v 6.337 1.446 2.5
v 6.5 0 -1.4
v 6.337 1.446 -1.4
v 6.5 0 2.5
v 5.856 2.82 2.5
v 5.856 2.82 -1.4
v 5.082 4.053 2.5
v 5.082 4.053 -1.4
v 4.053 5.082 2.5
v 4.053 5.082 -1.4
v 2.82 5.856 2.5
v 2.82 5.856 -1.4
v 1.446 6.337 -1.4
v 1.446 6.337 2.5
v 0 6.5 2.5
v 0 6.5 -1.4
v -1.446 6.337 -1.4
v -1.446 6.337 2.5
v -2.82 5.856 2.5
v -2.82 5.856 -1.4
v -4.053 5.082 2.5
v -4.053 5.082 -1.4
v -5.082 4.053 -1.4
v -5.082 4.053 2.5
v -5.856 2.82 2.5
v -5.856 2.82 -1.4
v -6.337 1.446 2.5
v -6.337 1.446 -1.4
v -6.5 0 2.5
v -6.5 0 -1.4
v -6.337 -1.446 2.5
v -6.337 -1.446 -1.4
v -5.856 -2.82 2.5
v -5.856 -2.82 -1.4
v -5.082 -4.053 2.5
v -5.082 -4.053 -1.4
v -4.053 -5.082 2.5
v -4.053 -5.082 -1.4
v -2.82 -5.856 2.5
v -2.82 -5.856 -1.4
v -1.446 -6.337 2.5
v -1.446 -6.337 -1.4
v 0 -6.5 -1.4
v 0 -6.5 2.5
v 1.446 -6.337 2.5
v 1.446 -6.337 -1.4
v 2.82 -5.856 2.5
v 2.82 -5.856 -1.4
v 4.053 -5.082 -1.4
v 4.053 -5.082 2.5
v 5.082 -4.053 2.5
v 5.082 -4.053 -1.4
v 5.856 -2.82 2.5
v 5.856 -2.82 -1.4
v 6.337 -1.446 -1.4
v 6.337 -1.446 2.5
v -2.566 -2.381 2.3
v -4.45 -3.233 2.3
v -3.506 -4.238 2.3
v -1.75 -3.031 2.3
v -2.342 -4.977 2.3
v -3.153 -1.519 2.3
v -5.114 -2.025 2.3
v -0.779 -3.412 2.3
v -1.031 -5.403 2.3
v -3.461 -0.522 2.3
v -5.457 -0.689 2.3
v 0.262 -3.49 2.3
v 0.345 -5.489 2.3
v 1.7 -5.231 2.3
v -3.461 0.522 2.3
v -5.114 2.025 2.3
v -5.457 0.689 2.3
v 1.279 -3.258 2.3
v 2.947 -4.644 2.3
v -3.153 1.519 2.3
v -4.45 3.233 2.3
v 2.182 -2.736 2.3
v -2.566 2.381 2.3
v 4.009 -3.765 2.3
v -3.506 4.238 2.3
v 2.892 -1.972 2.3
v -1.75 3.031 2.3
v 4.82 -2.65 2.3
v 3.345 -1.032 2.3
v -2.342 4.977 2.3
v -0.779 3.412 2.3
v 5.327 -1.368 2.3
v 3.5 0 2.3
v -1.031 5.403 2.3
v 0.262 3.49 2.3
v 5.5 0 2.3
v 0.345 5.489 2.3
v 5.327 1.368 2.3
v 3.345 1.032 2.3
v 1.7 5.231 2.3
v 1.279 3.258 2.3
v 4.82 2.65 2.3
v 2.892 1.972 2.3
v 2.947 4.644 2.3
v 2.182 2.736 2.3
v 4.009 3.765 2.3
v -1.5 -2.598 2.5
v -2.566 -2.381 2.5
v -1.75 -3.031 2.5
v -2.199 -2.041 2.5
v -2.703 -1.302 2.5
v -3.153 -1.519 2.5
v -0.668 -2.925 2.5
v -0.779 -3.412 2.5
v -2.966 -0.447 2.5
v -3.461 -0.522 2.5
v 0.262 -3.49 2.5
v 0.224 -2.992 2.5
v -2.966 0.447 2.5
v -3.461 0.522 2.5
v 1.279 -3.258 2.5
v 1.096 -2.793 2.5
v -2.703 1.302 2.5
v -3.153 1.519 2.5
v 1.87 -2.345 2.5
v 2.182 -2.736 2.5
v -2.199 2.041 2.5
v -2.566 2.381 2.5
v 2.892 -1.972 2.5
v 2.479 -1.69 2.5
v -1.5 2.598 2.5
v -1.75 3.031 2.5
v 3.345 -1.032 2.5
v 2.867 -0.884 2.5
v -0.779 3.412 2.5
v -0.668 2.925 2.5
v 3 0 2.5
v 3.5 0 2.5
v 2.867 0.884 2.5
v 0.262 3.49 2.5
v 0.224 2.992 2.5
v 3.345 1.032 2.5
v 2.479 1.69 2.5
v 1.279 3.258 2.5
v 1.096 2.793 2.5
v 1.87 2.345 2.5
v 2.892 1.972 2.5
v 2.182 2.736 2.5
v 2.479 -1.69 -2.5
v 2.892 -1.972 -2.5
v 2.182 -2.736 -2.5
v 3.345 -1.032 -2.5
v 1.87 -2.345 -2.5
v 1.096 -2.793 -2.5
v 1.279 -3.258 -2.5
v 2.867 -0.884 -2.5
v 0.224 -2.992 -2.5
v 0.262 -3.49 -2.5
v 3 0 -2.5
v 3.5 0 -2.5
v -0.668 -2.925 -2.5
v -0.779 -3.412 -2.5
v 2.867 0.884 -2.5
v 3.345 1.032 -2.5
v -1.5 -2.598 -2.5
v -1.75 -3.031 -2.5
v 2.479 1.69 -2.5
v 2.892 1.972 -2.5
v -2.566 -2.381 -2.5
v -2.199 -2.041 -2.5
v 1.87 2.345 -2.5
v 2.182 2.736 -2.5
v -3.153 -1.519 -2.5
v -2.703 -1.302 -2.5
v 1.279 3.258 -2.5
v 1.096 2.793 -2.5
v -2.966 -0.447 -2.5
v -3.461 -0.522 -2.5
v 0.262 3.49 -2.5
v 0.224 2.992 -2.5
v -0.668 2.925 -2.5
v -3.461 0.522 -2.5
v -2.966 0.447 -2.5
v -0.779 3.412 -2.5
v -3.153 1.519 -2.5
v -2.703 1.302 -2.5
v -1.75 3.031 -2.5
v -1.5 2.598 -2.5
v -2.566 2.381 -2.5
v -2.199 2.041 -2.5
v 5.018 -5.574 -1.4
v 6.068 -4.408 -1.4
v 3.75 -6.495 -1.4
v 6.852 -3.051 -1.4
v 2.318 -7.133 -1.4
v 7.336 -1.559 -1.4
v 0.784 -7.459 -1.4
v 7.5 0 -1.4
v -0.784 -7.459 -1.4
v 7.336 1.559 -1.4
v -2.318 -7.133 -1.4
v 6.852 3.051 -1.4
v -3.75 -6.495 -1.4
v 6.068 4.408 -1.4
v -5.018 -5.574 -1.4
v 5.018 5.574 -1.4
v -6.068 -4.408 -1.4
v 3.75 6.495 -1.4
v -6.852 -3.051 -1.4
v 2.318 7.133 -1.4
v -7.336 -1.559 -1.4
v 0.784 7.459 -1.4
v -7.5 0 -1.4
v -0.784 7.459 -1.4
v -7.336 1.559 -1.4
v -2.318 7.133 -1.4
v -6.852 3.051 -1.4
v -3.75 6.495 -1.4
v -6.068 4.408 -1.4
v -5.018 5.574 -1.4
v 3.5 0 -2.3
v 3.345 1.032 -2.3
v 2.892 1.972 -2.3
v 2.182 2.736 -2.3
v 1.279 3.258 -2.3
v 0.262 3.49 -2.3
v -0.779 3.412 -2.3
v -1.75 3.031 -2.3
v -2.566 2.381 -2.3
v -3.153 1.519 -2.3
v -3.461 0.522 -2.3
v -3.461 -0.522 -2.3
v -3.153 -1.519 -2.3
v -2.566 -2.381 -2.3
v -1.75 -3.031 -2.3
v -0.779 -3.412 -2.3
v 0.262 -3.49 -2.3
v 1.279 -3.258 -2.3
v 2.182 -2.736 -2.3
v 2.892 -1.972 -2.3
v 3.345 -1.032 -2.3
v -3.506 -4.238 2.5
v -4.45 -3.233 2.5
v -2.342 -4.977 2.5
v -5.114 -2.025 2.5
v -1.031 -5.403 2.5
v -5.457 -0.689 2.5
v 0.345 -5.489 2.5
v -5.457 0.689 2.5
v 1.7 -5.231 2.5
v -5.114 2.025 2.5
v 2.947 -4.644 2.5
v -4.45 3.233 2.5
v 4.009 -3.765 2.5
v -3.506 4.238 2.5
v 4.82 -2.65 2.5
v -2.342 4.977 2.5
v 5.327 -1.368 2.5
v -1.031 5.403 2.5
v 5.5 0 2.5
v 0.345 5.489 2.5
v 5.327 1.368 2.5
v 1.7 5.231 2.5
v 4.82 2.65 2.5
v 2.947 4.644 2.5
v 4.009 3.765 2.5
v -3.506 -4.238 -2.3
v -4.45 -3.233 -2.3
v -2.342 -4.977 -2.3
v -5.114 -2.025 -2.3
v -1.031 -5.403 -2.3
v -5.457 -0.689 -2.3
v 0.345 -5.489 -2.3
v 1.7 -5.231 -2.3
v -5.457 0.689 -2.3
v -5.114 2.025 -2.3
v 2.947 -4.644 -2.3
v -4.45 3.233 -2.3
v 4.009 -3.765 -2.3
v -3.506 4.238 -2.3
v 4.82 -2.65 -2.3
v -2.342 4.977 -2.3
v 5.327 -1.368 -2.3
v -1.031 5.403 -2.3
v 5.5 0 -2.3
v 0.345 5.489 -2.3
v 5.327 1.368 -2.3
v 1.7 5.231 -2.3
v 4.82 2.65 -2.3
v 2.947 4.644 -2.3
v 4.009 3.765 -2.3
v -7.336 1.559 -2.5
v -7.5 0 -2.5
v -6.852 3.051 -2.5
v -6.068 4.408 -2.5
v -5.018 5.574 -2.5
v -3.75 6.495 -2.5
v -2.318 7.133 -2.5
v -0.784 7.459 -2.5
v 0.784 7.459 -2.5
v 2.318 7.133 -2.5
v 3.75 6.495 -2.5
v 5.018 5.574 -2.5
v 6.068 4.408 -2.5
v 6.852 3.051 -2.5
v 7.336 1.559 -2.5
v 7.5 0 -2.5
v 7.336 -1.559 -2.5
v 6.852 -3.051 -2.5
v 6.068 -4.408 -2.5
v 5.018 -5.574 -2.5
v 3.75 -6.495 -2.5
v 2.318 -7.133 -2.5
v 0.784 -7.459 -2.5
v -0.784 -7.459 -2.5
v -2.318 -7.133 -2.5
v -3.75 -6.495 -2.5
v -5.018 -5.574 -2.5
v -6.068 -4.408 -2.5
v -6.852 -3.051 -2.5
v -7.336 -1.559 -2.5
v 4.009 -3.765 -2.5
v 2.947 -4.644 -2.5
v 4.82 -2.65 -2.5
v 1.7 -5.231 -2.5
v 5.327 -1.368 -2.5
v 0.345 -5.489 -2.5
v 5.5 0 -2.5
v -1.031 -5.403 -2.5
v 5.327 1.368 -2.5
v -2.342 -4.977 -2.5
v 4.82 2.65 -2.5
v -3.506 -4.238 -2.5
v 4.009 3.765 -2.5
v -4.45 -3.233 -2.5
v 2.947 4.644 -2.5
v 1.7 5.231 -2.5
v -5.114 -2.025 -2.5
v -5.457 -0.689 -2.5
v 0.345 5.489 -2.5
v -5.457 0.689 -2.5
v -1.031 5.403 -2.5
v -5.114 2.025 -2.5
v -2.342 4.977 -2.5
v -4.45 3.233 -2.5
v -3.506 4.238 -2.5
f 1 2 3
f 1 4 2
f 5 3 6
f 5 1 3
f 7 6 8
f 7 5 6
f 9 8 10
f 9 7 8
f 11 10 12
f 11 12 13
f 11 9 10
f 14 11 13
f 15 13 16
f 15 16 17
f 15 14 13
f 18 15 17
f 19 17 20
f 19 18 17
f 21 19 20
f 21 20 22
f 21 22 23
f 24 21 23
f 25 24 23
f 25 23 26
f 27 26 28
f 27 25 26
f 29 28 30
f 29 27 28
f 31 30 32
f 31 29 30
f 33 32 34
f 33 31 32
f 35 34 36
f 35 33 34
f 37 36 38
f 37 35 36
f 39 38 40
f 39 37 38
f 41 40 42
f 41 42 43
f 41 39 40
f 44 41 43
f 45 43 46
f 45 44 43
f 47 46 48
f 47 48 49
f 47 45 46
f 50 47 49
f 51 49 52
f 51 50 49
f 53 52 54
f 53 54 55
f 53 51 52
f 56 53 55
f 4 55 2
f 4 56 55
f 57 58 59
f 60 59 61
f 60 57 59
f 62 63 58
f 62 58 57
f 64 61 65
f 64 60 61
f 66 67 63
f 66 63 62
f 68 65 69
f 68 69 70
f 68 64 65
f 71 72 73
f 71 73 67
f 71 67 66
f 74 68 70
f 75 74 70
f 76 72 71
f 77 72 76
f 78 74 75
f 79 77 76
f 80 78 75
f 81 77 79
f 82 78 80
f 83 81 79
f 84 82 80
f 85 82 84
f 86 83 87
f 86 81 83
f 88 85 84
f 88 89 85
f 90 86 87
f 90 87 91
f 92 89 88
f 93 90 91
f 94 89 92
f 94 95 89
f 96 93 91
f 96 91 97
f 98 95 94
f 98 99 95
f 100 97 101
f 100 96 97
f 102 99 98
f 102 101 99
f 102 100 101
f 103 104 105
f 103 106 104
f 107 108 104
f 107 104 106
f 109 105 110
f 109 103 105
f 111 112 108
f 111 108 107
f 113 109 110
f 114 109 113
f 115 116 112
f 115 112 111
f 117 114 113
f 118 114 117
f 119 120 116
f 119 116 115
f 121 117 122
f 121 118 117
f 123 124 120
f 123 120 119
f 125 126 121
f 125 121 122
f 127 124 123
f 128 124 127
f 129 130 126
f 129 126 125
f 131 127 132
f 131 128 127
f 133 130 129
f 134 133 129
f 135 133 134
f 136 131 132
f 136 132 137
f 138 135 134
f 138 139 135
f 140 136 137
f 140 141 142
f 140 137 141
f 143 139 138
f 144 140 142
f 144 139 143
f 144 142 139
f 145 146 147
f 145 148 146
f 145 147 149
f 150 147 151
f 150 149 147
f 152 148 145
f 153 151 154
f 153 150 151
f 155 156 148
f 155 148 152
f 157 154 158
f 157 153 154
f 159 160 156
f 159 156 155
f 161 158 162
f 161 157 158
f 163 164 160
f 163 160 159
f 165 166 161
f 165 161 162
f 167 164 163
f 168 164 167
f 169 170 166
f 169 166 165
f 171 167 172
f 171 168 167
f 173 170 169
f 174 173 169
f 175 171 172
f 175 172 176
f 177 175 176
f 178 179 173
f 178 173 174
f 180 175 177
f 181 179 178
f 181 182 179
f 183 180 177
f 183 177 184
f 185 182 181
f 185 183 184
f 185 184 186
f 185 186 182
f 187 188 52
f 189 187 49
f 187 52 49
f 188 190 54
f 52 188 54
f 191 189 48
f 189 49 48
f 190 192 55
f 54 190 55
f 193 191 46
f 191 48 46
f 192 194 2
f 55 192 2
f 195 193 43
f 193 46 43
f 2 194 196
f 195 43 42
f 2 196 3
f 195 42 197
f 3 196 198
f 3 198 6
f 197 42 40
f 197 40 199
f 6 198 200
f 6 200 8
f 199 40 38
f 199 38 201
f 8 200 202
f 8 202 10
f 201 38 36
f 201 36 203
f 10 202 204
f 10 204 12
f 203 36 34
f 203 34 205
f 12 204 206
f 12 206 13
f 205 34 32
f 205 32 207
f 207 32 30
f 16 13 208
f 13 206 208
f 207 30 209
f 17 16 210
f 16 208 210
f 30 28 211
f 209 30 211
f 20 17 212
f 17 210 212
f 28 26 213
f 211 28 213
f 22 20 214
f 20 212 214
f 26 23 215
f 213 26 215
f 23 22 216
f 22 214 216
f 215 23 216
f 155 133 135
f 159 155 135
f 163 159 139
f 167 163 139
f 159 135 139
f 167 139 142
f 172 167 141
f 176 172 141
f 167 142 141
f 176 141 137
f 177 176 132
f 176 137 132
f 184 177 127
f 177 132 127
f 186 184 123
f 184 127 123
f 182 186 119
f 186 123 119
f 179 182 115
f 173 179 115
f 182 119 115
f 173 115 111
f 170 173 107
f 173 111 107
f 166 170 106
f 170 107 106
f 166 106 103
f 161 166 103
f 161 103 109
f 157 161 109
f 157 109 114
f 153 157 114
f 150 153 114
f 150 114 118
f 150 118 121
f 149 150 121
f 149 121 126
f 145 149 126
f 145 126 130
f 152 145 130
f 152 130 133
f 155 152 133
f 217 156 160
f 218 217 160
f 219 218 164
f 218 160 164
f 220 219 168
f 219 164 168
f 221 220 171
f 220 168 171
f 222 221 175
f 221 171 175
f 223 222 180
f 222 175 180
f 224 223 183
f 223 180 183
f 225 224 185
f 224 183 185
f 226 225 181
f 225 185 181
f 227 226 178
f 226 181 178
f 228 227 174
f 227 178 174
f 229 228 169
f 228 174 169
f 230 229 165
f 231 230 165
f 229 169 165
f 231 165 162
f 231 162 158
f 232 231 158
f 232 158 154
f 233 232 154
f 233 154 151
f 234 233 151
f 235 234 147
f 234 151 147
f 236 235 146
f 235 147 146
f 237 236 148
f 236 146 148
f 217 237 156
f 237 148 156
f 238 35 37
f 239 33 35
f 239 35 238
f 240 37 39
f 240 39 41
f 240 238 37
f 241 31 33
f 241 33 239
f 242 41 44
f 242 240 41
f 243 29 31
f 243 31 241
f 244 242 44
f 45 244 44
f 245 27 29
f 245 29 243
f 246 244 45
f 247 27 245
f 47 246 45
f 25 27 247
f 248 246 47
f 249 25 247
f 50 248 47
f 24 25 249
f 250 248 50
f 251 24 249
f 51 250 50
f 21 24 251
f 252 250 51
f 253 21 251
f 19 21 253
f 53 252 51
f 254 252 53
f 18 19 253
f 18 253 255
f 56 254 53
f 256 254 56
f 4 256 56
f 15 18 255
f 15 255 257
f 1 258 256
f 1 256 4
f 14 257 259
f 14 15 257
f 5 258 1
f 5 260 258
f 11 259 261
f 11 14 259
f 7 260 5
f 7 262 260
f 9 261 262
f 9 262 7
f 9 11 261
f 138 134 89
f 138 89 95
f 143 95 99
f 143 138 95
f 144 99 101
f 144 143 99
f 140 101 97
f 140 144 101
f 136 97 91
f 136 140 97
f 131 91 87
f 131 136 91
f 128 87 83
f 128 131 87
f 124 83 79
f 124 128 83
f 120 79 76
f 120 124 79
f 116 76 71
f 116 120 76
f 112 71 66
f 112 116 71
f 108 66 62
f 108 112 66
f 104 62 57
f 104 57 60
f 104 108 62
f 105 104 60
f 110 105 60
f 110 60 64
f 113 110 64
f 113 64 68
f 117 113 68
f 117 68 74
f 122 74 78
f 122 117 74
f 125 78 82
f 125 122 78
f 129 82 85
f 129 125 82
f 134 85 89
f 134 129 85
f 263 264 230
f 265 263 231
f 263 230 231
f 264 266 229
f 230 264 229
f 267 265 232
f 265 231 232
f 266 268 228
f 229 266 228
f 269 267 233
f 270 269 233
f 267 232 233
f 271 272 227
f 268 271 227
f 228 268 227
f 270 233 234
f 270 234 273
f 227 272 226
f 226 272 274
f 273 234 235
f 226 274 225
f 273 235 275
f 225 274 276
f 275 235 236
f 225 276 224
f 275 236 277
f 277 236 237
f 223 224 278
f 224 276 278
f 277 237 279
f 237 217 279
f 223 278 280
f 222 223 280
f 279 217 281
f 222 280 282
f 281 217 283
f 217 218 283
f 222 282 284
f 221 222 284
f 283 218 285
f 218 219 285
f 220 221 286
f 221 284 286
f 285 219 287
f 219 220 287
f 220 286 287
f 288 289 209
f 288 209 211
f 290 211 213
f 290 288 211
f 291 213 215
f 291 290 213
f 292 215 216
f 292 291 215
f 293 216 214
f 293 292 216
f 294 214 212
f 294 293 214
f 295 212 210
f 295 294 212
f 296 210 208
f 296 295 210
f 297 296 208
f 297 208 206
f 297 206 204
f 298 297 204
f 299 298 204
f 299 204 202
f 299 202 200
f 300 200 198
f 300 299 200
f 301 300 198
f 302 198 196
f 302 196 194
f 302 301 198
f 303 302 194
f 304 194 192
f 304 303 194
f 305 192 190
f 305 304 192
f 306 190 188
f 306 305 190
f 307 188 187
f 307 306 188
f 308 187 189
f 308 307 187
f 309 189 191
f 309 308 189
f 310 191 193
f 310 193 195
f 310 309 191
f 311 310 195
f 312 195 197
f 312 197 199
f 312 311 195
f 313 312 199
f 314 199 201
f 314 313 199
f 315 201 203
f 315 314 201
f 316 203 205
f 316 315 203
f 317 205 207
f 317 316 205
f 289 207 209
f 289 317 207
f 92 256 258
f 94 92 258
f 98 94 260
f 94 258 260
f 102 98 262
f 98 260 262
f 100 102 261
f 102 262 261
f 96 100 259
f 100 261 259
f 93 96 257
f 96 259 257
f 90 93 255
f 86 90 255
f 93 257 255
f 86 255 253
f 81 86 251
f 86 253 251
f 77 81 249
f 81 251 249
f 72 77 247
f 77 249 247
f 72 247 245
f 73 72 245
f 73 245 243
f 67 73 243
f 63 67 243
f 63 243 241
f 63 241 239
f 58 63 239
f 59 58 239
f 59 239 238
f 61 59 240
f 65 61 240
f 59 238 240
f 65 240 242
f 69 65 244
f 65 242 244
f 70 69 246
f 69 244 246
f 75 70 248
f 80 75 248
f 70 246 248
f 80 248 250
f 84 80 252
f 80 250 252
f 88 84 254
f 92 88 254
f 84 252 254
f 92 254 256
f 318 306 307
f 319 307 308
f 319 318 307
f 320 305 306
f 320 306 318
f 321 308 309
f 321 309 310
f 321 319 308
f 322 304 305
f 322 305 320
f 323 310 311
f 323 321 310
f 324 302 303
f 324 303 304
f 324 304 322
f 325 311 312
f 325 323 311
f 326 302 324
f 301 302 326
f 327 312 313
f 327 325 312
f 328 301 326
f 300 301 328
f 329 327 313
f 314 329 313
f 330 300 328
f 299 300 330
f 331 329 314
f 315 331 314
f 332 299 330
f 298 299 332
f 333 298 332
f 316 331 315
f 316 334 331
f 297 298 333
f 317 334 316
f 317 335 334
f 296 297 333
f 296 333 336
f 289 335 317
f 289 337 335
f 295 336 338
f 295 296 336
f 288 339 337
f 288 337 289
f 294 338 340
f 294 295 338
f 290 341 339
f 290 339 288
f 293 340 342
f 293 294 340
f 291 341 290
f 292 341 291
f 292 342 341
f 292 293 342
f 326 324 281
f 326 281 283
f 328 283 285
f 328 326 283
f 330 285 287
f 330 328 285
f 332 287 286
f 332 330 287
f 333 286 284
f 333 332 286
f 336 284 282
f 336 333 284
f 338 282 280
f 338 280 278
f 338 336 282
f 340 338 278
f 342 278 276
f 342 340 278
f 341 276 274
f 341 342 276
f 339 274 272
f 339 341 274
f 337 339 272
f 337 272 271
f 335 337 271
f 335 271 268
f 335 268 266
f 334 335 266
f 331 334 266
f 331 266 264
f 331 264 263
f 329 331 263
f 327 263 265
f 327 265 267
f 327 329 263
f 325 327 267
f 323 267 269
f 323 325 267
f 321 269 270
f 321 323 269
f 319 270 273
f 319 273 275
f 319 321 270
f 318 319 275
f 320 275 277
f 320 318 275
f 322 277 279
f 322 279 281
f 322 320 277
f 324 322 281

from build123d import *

# Parameters (mm, degrees)
SKETCH_1_R          = 6.5
EXTRUDE_1_DEPTH     = 2.5
SKETCH_4_R          = 7.5
EXTRUDE_2_DEPTH     = 1.1
SKETCH_2_R          = 3
CUT_EXTRUDE_1_DEPTH = 6
SKETCH_3_R          = 5.5
SKETCH_3_R_2        = 3.5
CUT_EXTRUDE_2_DEPTH = 0.2


with BuildPart() as part:
    # 草圖1 → 填料-伸長1 (new body, symmetric)
    with BuildSketch(Plane.XY):
        Circle(SKETCH_1_R)
    extrude(amount=EXTRUDE_1_DEPTH, both=True)

    # 草圖4 → 填料-伸長2 (add)
    with BuildSketch(Plane(origin=(0, 0, -2.5), x_dir=(-1, 0, 0), z_dir=(0, 0, -1))):
        Circle(SKETCH_4_R)
    extrude(amount=-EXTRUDE_2_DEPTH)

    # 草圖2 → 除料-伸長1 (cut, through all)
    with BuildSketch(Plane.XY.offset(2.5)):
        Circle(SKETCH_2_R)
    extrude(amount=-CUT_EXTRUDE_1_DEPTH, mode=Mode.SUBTRACT)

    # 草圖3 → 除料-伸長2 (cut)
    with BuildSketch(Plane.XY.offset(2.5)):
        Circle(SKETCH_3_R)
        Circle(SKETCH_3_R_2, mode=Mode.SUBTRACT)
    cut_extrude_2 = extrude(amount=-CUT_EXTRUDE_2_DEPTH, mode=Mode.SUBTRACT)

    # 鏡射1: 除料-伸長2 across plane
    add(cut_extrude_2.mirror(Plane.XY), mode=Mode.SUBTRACT)


solid = part.part
